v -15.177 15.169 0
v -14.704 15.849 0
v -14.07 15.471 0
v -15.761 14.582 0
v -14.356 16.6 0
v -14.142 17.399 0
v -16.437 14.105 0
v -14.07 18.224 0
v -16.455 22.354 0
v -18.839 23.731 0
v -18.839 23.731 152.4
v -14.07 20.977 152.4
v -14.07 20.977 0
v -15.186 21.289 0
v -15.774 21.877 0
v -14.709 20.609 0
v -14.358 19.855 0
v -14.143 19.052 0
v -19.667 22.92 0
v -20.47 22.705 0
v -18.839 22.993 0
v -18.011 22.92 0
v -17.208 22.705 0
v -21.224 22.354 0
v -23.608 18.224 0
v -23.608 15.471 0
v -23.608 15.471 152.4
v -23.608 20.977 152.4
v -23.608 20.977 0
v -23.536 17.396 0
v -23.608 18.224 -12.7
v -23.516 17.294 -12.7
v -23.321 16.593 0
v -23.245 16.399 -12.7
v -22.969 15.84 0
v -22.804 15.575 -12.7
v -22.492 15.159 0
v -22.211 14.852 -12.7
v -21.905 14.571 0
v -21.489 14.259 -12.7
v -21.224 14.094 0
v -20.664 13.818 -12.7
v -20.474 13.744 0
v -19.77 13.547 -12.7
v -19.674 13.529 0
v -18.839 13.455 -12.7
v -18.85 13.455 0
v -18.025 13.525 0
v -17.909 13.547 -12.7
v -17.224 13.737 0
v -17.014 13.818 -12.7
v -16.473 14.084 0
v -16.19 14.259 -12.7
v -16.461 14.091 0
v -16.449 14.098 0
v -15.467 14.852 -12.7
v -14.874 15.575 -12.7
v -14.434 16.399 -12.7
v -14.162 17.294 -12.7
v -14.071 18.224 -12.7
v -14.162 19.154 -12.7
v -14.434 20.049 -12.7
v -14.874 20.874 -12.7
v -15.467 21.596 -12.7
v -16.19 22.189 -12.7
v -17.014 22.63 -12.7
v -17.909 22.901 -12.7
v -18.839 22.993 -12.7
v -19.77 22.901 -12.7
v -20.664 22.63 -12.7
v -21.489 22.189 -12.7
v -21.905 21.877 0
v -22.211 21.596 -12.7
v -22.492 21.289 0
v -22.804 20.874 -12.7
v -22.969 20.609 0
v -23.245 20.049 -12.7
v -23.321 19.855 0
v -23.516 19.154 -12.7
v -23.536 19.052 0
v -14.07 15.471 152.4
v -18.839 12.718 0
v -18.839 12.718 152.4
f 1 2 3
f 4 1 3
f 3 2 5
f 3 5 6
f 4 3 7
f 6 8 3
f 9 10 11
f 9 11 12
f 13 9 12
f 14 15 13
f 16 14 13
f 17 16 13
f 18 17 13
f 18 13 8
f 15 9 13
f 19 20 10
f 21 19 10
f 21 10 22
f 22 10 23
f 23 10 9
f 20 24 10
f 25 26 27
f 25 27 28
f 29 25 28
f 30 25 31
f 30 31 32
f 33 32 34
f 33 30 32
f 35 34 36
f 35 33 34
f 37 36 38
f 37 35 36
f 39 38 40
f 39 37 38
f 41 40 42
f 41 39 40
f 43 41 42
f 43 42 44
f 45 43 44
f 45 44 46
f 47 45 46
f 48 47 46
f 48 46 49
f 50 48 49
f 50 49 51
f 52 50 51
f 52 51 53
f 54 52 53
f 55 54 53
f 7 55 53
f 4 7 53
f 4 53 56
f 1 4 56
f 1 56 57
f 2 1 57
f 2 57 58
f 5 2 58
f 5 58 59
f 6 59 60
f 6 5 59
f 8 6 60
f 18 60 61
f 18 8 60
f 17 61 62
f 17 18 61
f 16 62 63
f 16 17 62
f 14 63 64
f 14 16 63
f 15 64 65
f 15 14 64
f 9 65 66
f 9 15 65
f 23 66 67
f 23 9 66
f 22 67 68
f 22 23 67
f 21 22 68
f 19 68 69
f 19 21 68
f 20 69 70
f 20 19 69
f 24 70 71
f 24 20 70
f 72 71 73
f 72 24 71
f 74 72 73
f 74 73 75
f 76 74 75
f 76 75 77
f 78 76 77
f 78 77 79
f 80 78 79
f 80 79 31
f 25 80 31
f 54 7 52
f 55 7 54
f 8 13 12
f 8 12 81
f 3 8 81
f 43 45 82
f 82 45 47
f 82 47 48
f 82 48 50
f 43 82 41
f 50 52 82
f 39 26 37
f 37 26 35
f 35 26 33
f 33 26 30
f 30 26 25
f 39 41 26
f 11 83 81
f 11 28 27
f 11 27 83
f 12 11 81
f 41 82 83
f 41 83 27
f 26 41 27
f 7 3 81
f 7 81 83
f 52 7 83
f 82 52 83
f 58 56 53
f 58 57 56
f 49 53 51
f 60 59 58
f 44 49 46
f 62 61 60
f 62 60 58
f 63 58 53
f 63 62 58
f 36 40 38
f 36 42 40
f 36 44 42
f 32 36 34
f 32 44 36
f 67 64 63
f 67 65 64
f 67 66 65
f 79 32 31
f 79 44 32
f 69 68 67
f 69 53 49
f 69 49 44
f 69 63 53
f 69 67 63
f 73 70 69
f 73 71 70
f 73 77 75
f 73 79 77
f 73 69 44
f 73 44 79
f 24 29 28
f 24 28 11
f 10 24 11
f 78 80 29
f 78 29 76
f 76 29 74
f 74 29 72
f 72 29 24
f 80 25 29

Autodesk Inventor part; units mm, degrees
ref_plane "YZ Plane" through (0, 0, 0) normal (1, 0, 0) x (0, 1, 0)
ref_plane "XZ Plane" through (0, 0, 0) normal (0, 1, 0) x (-1, 0, 0)
ref_plane "XY Plane" through (0, 0, 0) normal (0, 0, 1) x (1, 0, 0)
sketch "Sketch1" plane through (0, 0, 0) normal (0, 0, 1) x (1, 0, 0)
  line L0 (-16.4487, 14.1051) -> (-9.6381, 18.058)
  line L1 (-16.4487, 14.1051) -> (-18.8393, 18.2241)
  line L2 (-18.8393, 12.7176) -> (-23.6081, 15.4709)
  line L3 (-23.6081, 15.4709) -> (-23.6081, 20.9774)
  line L4 (-23.6081, 20.9774) -> (-18.8393, 23.7306)
  line L5 (-18.8393, 23.7306) -> (-14.0705, 20.9774)
  line L6 (-14.0705, 20.9774) -> (-14.0705, 15.4709)
  line L7 (-14.0705, 15.4709) -> (-18.8393, 12.7176)
  dimension "d5" = 4.7625
extrude "Extrusion1" add sketch "Sketch1" along normal blind 152.4
sketch "Sketch3" plane through (0, 0, 0) normal (0, 0, -1) x (-1, 0, 0)
  line L0 (23.6081, 15.4709) -> (18.8393, 12.7176) projected
  line L1 (18.8393, 12.7176) -> (18.8393, 18.2241)
  circle A0 centre (18.8393, 18.2241) radius 4.7688
  point P0 (0, 0)
extrude "Extrusion3" add sketch "Sketch3" along normal blind 12.7 contours A0
properties part number "Sanded Hex Rod"
